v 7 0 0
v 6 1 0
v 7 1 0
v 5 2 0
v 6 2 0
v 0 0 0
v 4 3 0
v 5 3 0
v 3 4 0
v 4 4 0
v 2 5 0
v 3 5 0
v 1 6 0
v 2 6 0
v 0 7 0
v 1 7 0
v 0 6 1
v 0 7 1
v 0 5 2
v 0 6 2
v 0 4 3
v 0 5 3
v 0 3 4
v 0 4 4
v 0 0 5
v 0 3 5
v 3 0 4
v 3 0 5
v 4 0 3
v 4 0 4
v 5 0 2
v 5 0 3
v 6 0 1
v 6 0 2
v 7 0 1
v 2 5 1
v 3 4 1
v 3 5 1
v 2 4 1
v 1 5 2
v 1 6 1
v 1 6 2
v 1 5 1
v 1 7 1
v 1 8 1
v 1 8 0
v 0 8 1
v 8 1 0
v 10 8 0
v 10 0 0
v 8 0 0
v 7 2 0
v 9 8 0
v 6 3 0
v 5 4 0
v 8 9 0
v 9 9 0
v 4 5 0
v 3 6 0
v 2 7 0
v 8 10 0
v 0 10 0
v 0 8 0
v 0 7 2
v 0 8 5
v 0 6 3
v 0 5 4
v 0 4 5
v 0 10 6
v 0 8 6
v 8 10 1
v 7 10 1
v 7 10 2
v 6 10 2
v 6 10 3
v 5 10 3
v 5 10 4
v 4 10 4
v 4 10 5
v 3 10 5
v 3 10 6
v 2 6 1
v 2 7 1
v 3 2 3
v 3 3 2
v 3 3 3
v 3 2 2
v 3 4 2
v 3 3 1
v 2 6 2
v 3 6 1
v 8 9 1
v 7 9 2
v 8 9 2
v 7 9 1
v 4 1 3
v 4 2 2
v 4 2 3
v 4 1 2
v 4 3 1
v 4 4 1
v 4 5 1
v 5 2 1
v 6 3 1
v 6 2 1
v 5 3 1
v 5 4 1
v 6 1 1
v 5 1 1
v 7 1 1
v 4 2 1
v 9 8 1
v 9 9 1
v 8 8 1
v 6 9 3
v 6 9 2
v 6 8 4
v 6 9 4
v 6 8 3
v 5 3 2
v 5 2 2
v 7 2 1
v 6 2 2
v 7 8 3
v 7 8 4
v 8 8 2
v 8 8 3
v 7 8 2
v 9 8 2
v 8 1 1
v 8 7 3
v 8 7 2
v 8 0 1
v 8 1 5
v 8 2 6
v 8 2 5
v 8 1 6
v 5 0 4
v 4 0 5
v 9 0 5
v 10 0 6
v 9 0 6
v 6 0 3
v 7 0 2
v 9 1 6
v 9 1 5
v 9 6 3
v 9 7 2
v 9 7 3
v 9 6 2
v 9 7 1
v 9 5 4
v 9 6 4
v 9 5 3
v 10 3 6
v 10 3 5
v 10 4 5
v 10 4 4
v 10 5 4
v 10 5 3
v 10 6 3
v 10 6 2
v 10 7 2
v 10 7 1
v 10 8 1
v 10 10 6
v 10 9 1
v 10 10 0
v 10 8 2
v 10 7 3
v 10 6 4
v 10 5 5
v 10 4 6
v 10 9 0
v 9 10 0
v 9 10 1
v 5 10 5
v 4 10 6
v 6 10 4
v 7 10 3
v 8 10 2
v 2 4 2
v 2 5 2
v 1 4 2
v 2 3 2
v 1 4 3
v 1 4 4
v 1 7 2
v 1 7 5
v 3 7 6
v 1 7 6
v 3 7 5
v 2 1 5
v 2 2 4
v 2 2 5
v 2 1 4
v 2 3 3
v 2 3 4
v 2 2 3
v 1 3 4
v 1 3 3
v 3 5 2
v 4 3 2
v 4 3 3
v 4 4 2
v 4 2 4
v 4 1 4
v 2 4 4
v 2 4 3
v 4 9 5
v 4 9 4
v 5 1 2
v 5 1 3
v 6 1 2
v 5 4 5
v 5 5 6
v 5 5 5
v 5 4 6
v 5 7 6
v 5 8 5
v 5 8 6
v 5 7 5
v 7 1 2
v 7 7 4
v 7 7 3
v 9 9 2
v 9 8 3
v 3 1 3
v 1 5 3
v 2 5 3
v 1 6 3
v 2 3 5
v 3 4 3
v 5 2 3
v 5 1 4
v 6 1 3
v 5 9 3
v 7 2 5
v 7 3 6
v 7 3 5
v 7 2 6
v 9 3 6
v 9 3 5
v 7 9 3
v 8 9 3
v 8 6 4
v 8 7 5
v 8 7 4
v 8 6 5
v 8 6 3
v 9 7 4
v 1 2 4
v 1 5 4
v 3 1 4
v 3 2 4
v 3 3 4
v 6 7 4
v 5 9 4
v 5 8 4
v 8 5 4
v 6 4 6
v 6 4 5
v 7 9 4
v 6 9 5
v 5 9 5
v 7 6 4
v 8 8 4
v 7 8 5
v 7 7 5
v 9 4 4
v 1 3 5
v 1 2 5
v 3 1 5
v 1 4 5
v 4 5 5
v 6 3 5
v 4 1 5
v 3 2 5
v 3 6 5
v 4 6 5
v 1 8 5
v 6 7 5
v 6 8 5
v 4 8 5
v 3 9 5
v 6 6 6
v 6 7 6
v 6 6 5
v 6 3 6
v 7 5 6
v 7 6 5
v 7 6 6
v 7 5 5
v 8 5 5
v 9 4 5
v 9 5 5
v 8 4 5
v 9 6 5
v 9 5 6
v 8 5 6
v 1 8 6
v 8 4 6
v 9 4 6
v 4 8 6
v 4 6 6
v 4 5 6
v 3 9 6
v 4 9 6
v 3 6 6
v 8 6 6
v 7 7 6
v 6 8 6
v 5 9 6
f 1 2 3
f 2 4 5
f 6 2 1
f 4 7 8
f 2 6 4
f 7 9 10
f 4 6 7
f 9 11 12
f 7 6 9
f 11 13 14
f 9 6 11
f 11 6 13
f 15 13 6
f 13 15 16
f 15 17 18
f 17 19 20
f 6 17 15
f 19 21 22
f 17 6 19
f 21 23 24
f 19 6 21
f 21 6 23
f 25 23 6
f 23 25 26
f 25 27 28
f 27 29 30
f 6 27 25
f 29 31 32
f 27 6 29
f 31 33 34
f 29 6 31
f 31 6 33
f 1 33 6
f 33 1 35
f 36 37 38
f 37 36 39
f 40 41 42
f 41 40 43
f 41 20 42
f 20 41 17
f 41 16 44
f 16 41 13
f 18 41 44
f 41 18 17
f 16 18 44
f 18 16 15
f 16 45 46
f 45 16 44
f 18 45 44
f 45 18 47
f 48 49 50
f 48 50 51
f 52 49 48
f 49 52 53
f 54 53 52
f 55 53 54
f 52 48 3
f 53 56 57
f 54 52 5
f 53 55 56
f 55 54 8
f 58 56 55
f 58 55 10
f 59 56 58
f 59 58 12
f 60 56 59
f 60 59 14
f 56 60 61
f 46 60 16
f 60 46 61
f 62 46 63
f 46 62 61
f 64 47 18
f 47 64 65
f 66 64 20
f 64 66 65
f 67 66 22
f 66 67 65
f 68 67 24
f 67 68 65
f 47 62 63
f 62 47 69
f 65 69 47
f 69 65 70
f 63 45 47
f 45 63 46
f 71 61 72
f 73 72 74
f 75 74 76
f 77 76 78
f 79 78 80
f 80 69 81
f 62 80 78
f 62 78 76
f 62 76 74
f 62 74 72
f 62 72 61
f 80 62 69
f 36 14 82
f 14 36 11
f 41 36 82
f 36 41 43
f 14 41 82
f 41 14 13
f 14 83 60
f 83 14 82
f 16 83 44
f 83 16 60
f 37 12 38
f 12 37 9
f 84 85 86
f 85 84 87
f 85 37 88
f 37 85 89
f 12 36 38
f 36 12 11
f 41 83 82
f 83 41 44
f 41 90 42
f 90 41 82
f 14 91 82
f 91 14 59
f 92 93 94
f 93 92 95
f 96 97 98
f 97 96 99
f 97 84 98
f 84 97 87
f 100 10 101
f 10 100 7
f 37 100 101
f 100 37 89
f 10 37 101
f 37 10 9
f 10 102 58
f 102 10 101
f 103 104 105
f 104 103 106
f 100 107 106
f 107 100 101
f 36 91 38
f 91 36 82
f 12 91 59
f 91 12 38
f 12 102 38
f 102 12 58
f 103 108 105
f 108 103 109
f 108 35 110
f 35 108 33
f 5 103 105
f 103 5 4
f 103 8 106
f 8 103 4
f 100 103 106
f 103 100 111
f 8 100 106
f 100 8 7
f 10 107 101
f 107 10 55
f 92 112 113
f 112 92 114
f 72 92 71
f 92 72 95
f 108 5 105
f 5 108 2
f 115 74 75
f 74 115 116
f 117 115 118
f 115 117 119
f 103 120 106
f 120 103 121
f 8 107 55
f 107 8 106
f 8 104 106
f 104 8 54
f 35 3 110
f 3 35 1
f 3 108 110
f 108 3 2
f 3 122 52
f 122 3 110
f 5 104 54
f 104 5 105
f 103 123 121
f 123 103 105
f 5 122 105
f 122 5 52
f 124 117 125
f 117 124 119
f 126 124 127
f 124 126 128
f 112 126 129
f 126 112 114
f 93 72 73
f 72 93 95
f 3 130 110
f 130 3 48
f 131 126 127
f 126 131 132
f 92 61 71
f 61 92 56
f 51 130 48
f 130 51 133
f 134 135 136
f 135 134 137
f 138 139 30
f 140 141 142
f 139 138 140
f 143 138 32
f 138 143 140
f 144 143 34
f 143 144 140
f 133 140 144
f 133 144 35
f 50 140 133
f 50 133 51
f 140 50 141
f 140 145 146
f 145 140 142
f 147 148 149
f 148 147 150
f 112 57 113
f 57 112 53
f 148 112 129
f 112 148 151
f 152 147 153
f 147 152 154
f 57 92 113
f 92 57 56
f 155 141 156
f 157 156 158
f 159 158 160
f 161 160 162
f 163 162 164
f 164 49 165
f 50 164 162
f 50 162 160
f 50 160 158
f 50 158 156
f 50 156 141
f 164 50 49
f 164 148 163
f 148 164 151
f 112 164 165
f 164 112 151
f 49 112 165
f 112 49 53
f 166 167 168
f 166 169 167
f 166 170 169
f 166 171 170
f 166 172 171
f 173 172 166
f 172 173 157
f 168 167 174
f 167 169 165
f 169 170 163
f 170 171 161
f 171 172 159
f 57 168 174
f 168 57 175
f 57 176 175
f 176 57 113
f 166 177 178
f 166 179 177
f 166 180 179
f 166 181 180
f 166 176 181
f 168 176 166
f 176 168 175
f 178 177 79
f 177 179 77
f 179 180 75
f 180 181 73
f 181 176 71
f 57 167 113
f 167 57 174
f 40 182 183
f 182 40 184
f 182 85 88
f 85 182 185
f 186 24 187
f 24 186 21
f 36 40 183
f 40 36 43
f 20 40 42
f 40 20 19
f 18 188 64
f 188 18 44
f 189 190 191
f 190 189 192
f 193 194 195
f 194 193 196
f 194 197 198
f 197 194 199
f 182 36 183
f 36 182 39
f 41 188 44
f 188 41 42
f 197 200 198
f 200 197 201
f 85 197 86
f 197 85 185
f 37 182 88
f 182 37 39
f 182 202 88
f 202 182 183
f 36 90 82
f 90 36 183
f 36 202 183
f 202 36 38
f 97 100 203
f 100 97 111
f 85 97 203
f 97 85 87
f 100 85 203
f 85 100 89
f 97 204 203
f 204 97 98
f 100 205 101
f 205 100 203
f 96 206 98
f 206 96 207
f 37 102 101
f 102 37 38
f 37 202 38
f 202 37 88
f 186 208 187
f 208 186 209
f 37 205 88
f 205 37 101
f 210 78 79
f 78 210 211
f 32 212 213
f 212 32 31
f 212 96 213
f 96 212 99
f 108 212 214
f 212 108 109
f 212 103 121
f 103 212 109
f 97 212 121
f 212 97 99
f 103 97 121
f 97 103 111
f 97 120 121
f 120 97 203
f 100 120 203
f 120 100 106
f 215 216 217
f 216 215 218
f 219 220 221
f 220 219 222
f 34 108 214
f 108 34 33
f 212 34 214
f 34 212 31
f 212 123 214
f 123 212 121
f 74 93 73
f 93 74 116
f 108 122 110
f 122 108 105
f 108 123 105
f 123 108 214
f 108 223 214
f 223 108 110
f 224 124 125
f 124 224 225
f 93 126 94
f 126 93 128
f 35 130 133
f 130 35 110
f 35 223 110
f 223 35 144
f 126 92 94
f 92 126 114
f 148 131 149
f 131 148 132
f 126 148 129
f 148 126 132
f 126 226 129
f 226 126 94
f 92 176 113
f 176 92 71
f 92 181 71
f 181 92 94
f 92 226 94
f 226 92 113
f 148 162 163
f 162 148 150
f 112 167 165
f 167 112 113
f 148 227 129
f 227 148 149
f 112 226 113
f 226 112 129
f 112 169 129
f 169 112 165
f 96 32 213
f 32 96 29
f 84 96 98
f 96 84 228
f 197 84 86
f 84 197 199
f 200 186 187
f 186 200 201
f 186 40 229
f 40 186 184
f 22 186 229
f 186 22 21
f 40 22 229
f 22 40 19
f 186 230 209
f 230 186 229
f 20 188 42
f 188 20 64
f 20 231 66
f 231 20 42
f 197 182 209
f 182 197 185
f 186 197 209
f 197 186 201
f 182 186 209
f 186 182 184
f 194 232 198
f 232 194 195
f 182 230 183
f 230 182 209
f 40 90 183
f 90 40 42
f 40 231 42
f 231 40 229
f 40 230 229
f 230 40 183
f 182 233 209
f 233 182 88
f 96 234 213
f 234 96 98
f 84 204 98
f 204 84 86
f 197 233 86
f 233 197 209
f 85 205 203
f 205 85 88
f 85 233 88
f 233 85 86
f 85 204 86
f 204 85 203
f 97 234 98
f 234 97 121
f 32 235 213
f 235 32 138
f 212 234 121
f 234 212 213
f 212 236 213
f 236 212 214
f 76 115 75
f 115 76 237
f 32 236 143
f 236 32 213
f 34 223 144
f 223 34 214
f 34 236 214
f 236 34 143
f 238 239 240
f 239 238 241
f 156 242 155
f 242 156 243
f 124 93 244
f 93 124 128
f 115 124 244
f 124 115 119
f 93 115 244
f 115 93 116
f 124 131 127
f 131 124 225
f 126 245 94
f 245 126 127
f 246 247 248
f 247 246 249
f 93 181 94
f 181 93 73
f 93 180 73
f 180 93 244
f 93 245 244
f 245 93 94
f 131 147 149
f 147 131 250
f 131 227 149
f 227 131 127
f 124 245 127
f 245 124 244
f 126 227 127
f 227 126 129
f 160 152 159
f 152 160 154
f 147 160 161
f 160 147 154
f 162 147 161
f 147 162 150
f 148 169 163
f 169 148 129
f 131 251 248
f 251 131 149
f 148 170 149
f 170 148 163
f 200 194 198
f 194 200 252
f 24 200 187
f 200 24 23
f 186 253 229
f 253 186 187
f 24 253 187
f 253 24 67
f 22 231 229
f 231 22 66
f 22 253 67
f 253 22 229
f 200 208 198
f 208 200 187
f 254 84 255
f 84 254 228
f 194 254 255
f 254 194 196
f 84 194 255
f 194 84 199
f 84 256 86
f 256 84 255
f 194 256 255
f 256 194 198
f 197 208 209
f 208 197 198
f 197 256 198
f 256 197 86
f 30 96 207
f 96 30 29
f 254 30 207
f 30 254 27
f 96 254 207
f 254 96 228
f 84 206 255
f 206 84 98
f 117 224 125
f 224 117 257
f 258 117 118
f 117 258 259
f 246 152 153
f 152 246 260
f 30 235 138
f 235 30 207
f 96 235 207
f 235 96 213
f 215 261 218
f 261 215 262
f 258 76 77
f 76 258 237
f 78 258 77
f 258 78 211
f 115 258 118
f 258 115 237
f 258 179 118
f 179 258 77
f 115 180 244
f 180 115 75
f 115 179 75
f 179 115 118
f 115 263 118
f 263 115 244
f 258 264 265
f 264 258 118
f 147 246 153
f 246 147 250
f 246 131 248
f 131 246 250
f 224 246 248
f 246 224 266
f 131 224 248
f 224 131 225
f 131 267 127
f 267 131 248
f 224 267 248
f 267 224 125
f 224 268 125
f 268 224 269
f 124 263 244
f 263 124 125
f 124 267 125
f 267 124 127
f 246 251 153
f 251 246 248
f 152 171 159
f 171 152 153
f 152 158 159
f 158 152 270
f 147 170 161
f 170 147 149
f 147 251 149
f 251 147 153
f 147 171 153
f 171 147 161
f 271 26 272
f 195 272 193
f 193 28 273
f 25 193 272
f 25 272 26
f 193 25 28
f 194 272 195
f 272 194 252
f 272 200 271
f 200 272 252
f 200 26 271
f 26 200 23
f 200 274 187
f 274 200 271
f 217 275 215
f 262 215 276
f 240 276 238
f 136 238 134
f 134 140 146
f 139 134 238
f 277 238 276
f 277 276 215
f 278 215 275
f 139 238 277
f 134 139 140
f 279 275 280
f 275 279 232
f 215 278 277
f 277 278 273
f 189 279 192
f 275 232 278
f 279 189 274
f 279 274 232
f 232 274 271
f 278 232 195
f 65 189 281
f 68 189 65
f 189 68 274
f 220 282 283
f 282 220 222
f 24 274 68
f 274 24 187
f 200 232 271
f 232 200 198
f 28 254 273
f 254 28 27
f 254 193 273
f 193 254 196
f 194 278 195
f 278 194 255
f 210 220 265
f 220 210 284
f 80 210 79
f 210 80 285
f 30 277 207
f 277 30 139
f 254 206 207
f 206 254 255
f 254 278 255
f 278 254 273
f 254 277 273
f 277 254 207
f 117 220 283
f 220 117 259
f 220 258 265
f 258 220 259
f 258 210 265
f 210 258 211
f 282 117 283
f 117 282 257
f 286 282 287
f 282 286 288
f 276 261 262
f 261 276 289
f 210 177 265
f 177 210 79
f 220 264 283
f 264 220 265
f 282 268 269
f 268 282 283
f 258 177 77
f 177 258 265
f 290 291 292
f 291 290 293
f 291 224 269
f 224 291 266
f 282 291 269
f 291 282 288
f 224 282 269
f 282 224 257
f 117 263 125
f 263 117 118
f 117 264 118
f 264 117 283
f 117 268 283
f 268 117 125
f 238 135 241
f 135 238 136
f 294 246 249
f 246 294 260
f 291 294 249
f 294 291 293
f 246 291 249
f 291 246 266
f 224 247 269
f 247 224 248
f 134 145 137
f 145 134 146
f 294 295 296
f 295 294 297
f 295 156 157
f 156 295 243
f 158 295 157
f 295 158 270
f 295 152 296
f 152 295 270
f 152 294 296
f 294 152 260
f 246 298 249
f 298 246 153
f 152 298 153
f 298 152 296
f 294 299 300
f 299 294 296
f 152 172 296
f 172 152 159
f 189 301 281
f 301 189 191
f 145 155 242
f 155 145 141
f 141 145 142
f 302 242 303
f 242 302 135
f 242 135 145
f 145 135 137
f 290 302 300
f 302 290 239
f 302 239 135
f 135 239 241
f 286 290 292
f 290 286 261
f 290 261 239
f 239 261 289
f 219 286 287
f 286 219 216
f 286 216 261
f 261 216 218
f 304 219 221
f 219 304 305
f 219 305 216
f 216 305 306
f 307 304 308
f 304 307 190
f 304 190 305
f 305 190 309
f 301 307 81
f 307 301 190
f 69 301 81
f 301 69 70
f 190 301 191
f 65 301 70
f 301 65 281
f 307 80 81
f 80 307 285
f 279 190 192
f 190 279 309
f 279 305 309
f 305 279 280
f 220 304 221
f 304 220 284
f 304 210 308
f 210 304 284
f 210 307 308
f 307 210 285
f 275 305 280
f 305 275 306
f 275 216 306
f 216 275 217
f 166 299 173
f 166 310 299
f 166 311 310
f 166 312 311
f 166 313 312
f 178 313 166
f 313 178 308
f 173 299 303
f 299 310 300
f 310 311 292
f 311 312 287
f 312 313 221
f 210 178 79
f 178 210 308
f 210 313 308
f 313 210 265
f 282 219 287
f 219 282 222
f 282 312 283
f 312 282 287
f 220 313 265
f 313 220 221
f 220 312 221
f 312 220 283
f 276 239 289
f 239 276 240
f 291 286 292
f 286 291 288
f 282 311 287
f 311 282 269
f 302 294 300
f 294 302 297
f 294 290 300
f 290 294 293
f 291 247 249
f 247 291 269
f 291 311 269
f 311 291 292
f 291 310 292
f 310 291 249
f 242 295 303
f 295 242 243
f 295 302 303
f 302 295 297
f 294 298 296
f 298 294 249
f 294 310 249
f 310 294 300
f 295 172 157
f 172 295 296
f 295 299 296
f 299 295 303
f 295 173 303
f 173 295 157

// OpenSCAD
union() {
    translate([0, 0, 0]) cube([1, 1, 1]);
    translate([0, 1, 0]) cube([1, 1, 1]);
    translate([0, 2, 0]) cube([1, 1, 1]);
    translate([0, 3, 0]) cube([1, 1, 1]);
    translate([0, 4, 0]) cube([1, 1, 1]);
    translate([0, 5, 0]) cube([1, 1, 1]);
    translate([0, 6, 0]) cube([1, 1, 1]);
    translate([0, 8, 0]) cube([1, 1, 1]);
    translate([0, 9, 0]) cube([1, 1, 1]);
    translate([1, 0, 0]) cube([1, 1, 1]);
    translate([1, 1, 0]) cube([1, 1, 1]);
    translate([1, 2, 0]) cube([1, 1, 1]);
    translate([1, 3, 0]) cube([1, 1, 1]);
    translate([1, 4, 0]) cube([1, 1, 1]);
    translate([1, 5, 0]) cube([1, 1, 1]);
    translate([1, 7, 0]) cube([1, 1, 1]);
    translate([1, 8, 0]) cube([1, 1, 1]);
    translate([1, 9, 0]) cube([1, 1, 1]);
    translate([2, 0, 0]) cube([1, 1, 1]);
    translate([2, 1, 0]) cube([1, 1, 1]);
    translate([2, 2, 0]) cube([1, 1, 1]);
    translate([2, 3, 0]) cube([1, 1, 1]);
    translate([2, 4, 0]) cube([1, 1, 1]);
    translate([2, 6, 0]) cube([1, 1, 1]);
    translate([2, 7, 0]) cube([1, 1, 1]);
    translate([2, 8, 0]) cube([1, 1, 1]);
    translate([2, 9, 0]) cube([1, 1, 1]);
    translate([3, 0, 0]) cube([1, 1, 1]);
    translate([3, 1, 0]) cube([1, 1, 1]);
    translate([3, 2, 0]) cube([1, 1, 1]);
    translate([3, 3, 0]) cube([1, 1, 1]);
    translate([3, 5, 0]) cube([1, 1, 1]);
    translate([3, 6, 0]) cube([1, 1, 1]);
    translate([3, 7, 0]) cube([1, 1, 1]);
    translate([3, 8, 0]) cube([1, 1, 1]);
    translate([3, 9, 0]) cube([1, 1, 1]);
    translate([4, 0, 0]) cube([1, 1, 1]);
    translate([4, 1, 0]) cube([1, 1, 1]);
    translate([4, 2, 0]) cube([1, 1, 1]);
    translate([4, 4, 0]) cube([1, 1, 1]);
    translate([4, 5, 0]) cube([1, 1, 1]);
    translate([4, 6, 0]) cube([1, 1, 1]);
    translate([4, 7, 0]) cube([1, 1, 1]);
    translate([4, 8, 0]) cube([1, 1, 1]);
    translate([4, 9, 0]) cube([1, 1, 1]);
    translate([5, 0, 0]) cube([1, 1, 1]);
    translate([5, 1, 0]) cube([1, 1, 1]);
    translate([5, 3, 0]) cube([1, 1, 1]);
    translate([5, 4, 0]) cube([1, 1, 1]);
    translate([5, 5, 0]) cube([1, 1, 1]);
    translate([5, 6, 0]) cube([1, 1, 1]);
    translate([5, 7, 0]) cube([1, 1, 1]);
    translate([5, 8, 0]) cube([1, 1, 1]);
    translate([5, 9, 0]) cube([1, 1, 1]);
    translate([6, 0, 0]) cube([1, 1, 1]);
    translate([6, 2, 0]) cube([1, 1, 1]);
    translate([6, 3, 0]) cube([1, 1, 1]);
    translate([6, 4, 0]) cube([1, 1, 1]);
    translate([6, 5, 0]) cube([1, 1, 1]);
    translate([6, 6, 0]) cube([1, 1, 1]);
    translate([6, 7, 0]) cube([1, 1, 1]);
    translate([6, 8, 0]) cube([1, 1, 1]);
    translate([6, 9, 0]) cube([1, 1, 1]);
    translate([7, 1, 0]) cube([1, 1, 1]);
    translate([7, 2, 0]) cube([1, 1, 1]);
    translate([7, 3, 0]) cube([1, 1, 1]);
    translate([7, 4, 0]) cube([1, 1, 1]);
    translate([7, 5, 0]) cube([1, 1, 1]);
    translate([7, 6, 0]) cube([1, 1, 1]);
    translate([7, 7, 0]) cube([1, 1, 1]);
    translate([7, 8, 0]) cube([1, 1, 1]);
    translate([7, 9, 0]) cube([1, 1, 1]);
    translate([8, 0, 0]) cube([1, 1, 1]);
    translate([8, 1, 0]) cube([1, 1, 1]);
    translate([8, 2, 0]) cube([1, 1, 1]);
    translate([8, 3, 0]) cube([1, 1, 1]);
    translate([8, 4, 0]) cube([1, 1, 1]);
    translate([8, 5, 0]) cube([1, 1, 1]);
    translate([8, 6, 0]) cube([1, 1, 1]);
    translate([8, 7, 0]) cube([1, 1, 1]);
    translate([8, 8, 0]) cube([1, 1, 1]);
    translate([9, 0, 0]) cube([1, 1, 1]);
    translate([9, 1, 0]) cube([1, 1, 1]);
    translate([9, 2, 0]) cube([1, 1, 1]);
    translate([9, 3, 0]) cube([1, 1, 1]);
    translate([9, 4, 0]) cube([1, 1, 1]);
    translate([9, 5, 0]) cube([1, 1, 1]);
    translate([9, 6, 0]) cube([1, 1, 1]);
    translate([9, 7, 0]) cube([1, 1, 1]);
    translate([9, 9, 0]) cube([1, 1, 1]);
    translate([0, 0, 1]) cube([1, 1, 1]);
    translate([0, 1, 1]) cube([1, 1, 1]);
    translate([0, 2, 1]) cube([1, 1, 1]);
    translate([0, 3, 1]) cube([1, 1, 1]);
    translate([0, 4, 1]) cube([1, 1, 1]);
    translate([0, 5, 1]) cube([1, 1, 1]);
    translate([0, 7, 1]) cube([1, 1, 1]);
    translate([0, 8, 1]) cube([1, 1, 1]);
    translate([0, 9, 1]) cube([1, 1, 1]);
    translate([1, 0, 1]) cube([1, 1, 1]);
    translate([1, 1, 1]) cube([1, 1, 1]);
    translate([1, 2, 1]) cube([1, 1, 1]);
    translate([1, 3, 1]) cube([1, 1, 1]);
    translate([1, 4, 1]) cube([1, 1, 1]);
    translate([1, 6, 1]) cube([1, 1, 1]);
    translate([1, 7, 1]) cube([1, 1, 1]);
    translate([1, 8, 1]) cube([1, 1, 1]);
    translate([1, 9, 1]) cube([1, 1, 1]);
    translate([2, 0, 1]) cube([1, 1, 1]);
    translate([2, 1, 1]) cube([1, 1, 1]);
    translate([2, 2, 1]) cube([1, 1, 1]);
    translate([2, 3, 1]) cube([1, 1, 1]);
    translate([2, 5, 1]) cube([1, 1, 1]);
    translate([2, 6, 1]) cube([1, 1, 1]);
    translate([2, 7, 1]) cube([1, 1, 1]);
    translate([2, 8, 1]) cube([1, 1, 1]);
    translate([2, 9, 1]) cube([1, 1, 1]);
    translate([3, 0, 1]) cube([1, 1, 1]);
    translate([3, 1, 1]) cube([1, 1, 1]);
    translate([3, 2, 1]) cube([1, 1, 1]);
    translate([3, 4, 1]) cube([1, 1, 1]);
    translate([3, 5, 1]) cube([1, 1, 1]);
    translate([3, 6, 1]) cube([1, 1, 1]);
    translate([3, 7, 1]) cube([1, 1, 1]);
    translate([3, 8, 1]) cube([1, 1, 1]);
    translate([3, 9, 1]) cube([1, 1, 1]);
    translate([4, 0, 1]) cube([1, 1, 1]);
    translate([4, 1, 1]) cube([1, 1, 1]);
    translate([4, 3, 1]) cube([1, 1, 1]);
    translate([4, 4, 1]) cube([1, 1, 1]);
    translate([4, 5, 1]) cube([1, 1, 1]);
    translate([4, 6, 1]) cube([1, 1, 1]);
    translate([4, 7, 1]) cube([1, 1, 1]);
    translate([4, 8, 1]) cube([1, 1, 1]);
    translate([4, 9, 1]) cube([1, 1, 1]);
    translate([5, 0, 1]) cube([1, 1, 1]);
    translate([5, 2, 1]) cube([1, 1, 1]);
    translate([5, 3, 1]) cube([1, 1, 1]);
    translate([5, 4, 1]) cube([1, 1, 1]);
    translate([5, 5, 1]) cube([1, 1, 1]);
    translate([5, 6, 1]) cube([1, 1, 1]);
    translate([5, 7, 1]) cube([1, 1, 1]);
    translate([5, 8, 1]) cube([1, 1, 1]);
    translate([5, 9, 1]) cube([1, 1, 1]);
    translate([6, 1, 1]) cube([1, 1, 1]);
    translate([6, 2, 1]) cube([1, 1, 1]);
    translate([6, 3, 1]) cube([1, 1, 1]);
    translate([6, 4, 1]) cube([1, 1, 1]);
    translate([6, 5, 1]) cube([1, 1, 1]);
    translate([6, 6, 1]) cube([1, 1, 1]);
    translate([6, 7, 1]) cube([1, 1, 1]);
    translate([6, 8, 1]) cube([1, 1, 1]);
    translate([6, 9, 1]) cube([1, 1, 1]);
    translate([7, 0, 1]) cube([1, 1, 1]);
    translate([7, 1, 1]) cube([1, 1, 1]);
    translate([7, 2, 1]) cube([1, 1, 1]);
    translate([7, 3, 1]) cube([1, 1, 1]);
    translate([7, 4, 1]) cube([1, 1, 1]);
    translate([7, 5, 1]) cube([1, 1, 1]);
    translate([7, 6, 1]) cube([1, 1, 1]);
    translate([7, 7, 1]) cube([1, 1, 1]);
    translate([7, 8, 1]) cube([1, 1, 1]);
    translate([8, 0, 1]) cube([1, 1, 1]);
    translate([8, 1, 1]) cube([1, 1, 1]);
    translate([8, 2, 1]) cube([1, 1, 1]);
    translate([8, 3, 1]) cube([1, 1, 1]);
    translate([8, 4, 1]) cube([1, 1, 1]);
    translate([8, 5, 1]) cube([1, 1, 1]);
    translate([8, 6, 1]) cube([1, 1, 1]);
    translate([8, 7, 1]) cube([1, 1, 1]);
    translate([8, 9, 1]) cube([1, 1, 1]);
    translate([9, 0, 1]) cube([1, 1, 1]);
    translate([9, 1, 1]) cube([1, 1, 1]);
    translate([9, 2, 1]) cube([1, 1, 1]);
    translate([9, 3, 1]) cube([1, 1, 1]);
    translate([9, 4, 1]) cube([1, 1, 1]);
    translate([9, 5, 1]) cube([1, 1, 1]);
    translate([9, 6, 1]) cube([1, 1, 1]);
    translate([9, 8, 1]) cube([1, 1, 1]);
    translate([9, 9, 1]) cube([1, 1, 1]);
    translate([0, 0, 2]) cube([1, 1, 1]);
    translate([0, 1, 2]) cube([1, 1, 1]);
    translate([0, 2, 2]) cube([1, 1, 1]);
    translate([0, 3, 2]) cube([1, 1, 1]);
    translate([0, 4, 2]) cube([1, 1, 1]);
    translate([0, 6, 2]) cube([1, 1, 1]);
    translate([0, 7, 2]) cube([1, 1, 1]);
    translate([0, 8, 2]) cube([1, 1, 1]);
    translate([0, 9, 2]) cube([1, 1, 1]);
    translate([1, 0, 2]) cube([1, 1, 1]);
    translate([1, 1, 2]) cube([1, 1, 1]);
    translate([1, 2, 2]) cube([1, 1, 1]);
    translate([1, 3, 2]) cube([1, 1, 1]);
    translate([1, 5, 2]) cube([1, 1, 1]);
    translate([1, 6, 2]) cube([1, 1, 1]);
    translate([1, 7, 2]) cube([1, 1, 1]);
    translate([1, 8, 2]) cube([1, 1, 1]);
    translate([1, 9, 2]) cube([1, 1, 1]);
    translate([2, 0, 2]) cube([1, 1, 1]);
    translate([2, 1, 2]) cube([1, 1, 1]);
    translate([2, 2, 2]) cube([1, 1, 1]);
    translate([2, 4, 2]) cube([1, 1, 1]);
    translate([2, 5, 2]) cube([1, 1, 1]);
    translate([2, 6, 2]) cube([1, 1, 1]);
    translate([2, 7, 2]) cube([1, 1, 1]);
    translate([2, 8, 2]) cube([1, 1, 1]);
    translate([2, 9, 2]) cube([1, 1, 1]);
    translate([3, 0, 2]) cube([1, 1, 1]);
    translate([3, 1, 2]) cube([1, 1, 1]);
    translate([3, 3, 2]) cube([1, 1, 1]);
    translate([3, 4, 2]) cube([1, 1, 1]);
    translate([3, 5, 2]) cube([1, 1, 1]);
    translate([3, 6, 2]) cube([1, 1, 1]);
    translate([3, 7, 2]) cube([1, 1, 1]);
    translate([3, 8, 2]) cube([1, 1, 1]);
    translate([3, 9, 2]) cube([1, 1, 1]);
    translate([4, 0, 2]) cube([1, 1, 1]);
    translate([4, 2, 2]) cube([1, 1, 1]);
    translate([4, 3, 2]) cube([1, 1, 1]);
    translate([4, 4, 2]) cube([1, 1, 1]);
    translate([4, 5, 2]) cube([1, 1, 1]);
    translate([4, 6, 2]) cube([1, 1, 1]);
    translate([4, 7, 2]) cube([1, 1, 1]);
    translate([4, 8, 2]) cube([1, 1, 1]);
    translate([4, 9, 2]) cube([1, 1, 1]);
    translate([5, 1, 2]) cube([1, 1, 1]);
    translate([5, 2, 2]) cube([1, 1, 1]);
    translate([5, 3, 2]) cube([1, 1, 1]);
    translate([5, 4, 2]) cube([1, 1, 1]);
    translate([5, 5, 2]) cube([1, 1, 1]);
    translate([5, 6, 2]) cube([1, 1, 1]);
    translate([5, 7, 2]) cube([1, 1, 1]);
    translate([5, 8, 2]) cube([1, 1, 1]);
    translate([5, 9, 2]) cube([1, 1, 1]);
    translate([6, 0, 2]) cube([1, 1, 1]);
    translate([6, 1, 2]) cube([1, 1, 1]);
    translate([6, 2, 2]) cube([1, 1, 1]);
    translate([6, 3, 2]) cube([1, 1, 1]);
    translate([6, 4, 2]) cube([1, 1, 1]);
    translate([6, 5, 2]) cube([1, 1, 1]);
    translate([6, 6, 2]) cube([1, 1, 1]);
    translate([6, 7, 2]) cube([1, 1, 1]);
    translate([6, 8, 2]) cube([1, 1, 1]);
    translate([7, 0, 2]) cube([1, 1, 1]);
    translate([7, 1, 2]) cube([1, 1, 1]);
    translate([7, 2, 2]) cube([1, 1, 1]);
    translate([7, 3, 2]) cube([1, 1, 1]);
    translate([7, 4, 2]) cube([1, 1, 1]);
    translate([7, 5, 2]) cube([1, 1, 1]);
    translate([7, 6, 2]) cube([1, 1, 1]);
    translate([7, 7, 2]) cube([1, 1, 1]);
    translate([7, 9, 2]) cube([1, 1, 1]);
    translate([8, 0, 2]) cube([1, 1, 1]);
    translate([8, 1, 2]) cube([1, 1, 1]);
    translate([8, 2, 2]) cube([1, 1, 1]);
    translate([8, 3, 2]) cube([1, 1, 1]);
    translate([8, 4, 2]) cube([1, 1, 1]);
    translate([8, 5, 2]) cube([1, 1, 1]);
    translate([8, 6, 2]) cube([1, 1, 1]);
    translate([8, 8, 2]) cube([1, 1, 1]);
    translate([8, 9, 2]) cube([1, 1, 1]);
    translate([9, 0, 2]) cube([1, 1, 1]);
    translate([9, 1, 2]) cube([1, 1, 1]);
    translate([9, 2, 2]) cube([1, 1, 1]);
    translate([9, 3, 2]) cube([1, 1, 1]);
    translate([9, 4, 2]) cube([1, 1, 1]);
    translate([9, 5, 2]) cube([1, 1, 1]);
    translate([9, 7, 2]) cube([1, 1, 1]);
    translate([9, 8, 2]) cube([1, 1, 1]);
    translate([9, 9, 2]) cube([1, 1, 1]);
    translate([0, 0, 3]) cube([1, 1, 1]);
    translate([0, 1, 3]) cube([1, 1, 1]);
    translate([0, 2, 3]) cube([1, 1, 1]);
    translate([0, 3, 3]) cube([1, 1, 1]);
    translate([0, 5, 3]) cube([1, 1, 1]);
    translate([0, 6, 3]) cube([1, 1, 1]);
    translate([0, 7, 3]) cube([1, 1, 1]);
    translate([0, 8, 3]) cube([1, 1, 1]);
    translate([0, 9, 3]) cube([1, 1, 1]);
    translate([1, 0, 3]) cube([1, 1, 1]);
    translate([1, 1, 3]) cube([1, 1, 1]);
    translate([1, 2, 3]) cube([1, 1, 1]);
    translate([1, 4, 3]) cube([1, 1, 1]);
    translate([1, 5, 3]) cube([1, 1, 1]);
    translate([1, 6, 3]) cube([1, 1, 1]);
    translate([1, 7, 3]) cube([1, 1, 1]);
    translate([1, 8, 3]) cube([1, 1, 1]);
    translate([1, 9, 3]) cube([1, 1, 1]);
    translate([2, 0, 3]) cube([1, 1, 1]);
    translate([2, 1, 3]) cube([1, 1, 1]);
    translate([2, 3, 3]) cube([1, 1, 1]);
    translate([2, 4, 3]) cube([1, 1, 1]);
    translate([2, 5, 3]) cube([1, 1, 1]);
    translate([2, 6, 3]) cube([1, 1, 1]);
    translate([2, 7, 3]) cube([1, 1, 1]);
    translate([2, 8, 3]) cube([1, 1, 1]);
    translate([2, 9, 3]) cube([1, 1, 1]);
    translate([3, 0, 3]) cube([1, 1, 1]);
    translate([3, 2, 3]) cube([1, 1, 1]);
    translate([3, 3, 3]) cube([1, 1, 1]);
    translate([3, 4, 3]) cube([1, 1, 1]);
    translate([3, 5, 3]) cube([1, 1, 1]);
    translate([3, 6, 3]) cube([1, 1, 1]);
    translate([3, 7, 3]) cube([1, 1, 1]);
    translate([3, 8, 3]) cube([1, 1, 1]);
    translate([3, 9, 3]) cube([1, 1, 1]);
    translate([4, 1, 3]) cube([1, 1, 1]);
    translate([4, 2, 3]) cube([1, 1, 1]);
    translate([4, 3, 3]) cube([1, 1, 1]);
    translate([4, 4, 3]) cube([1, 1, 1]);
    translate([4, 5, 3]) cube([1, 1, 1]);
    translate([4, 6, 3]) cube([1, 1, 1]);
    translate([4, 7, 3]) cube([1, 1, 1]);
    translate([4, 8, 3]) cube([1, 1, 1]);
    translate([4, 9, 3]) cube([1, 1, 1]);
    translate([5, 0, 3]) cube([1, 1, 1]);
    translate([5, 1, 3]) cube([1, 1, 1]);
    translate([5, 2, 3]) cube([1, 1, 1]);
    translate([5, 3, 3]) cube([1, 1, 1]);
    translate([5, 4, 3]) cube([1, 1, 1]);
    translate([5, 5, 3]) cube([1, 1, 1]);
    translate([5, 6, 3]) cube([1, 1, 1]);
    translate([5, 7, 3]) cube([1, 1, 1]);
    translate([5, 8, 3]) cube([1, 1, 1]);
    translate([6, 0, 3]) cube([1, 1, 1]);
    translate([6, 1, 3]) cube([1, 1, 1]);
    translate([6, 2, 3]) cube([1, 1, 1]);
    translate([6, 3, 3]) cube([1, 1, 1]);
    translate([6, 4, 3]) cube([1, 1, 1]);
    translate([6, 5, 3]) cube([1, 1, 1]);
    translate([6, 6, 3]) cube([1, 1, 1]);
    translate([6, 7, 3]) cube([1, 1, 1]);
    translate([6, 9, 3]) cube([1, 1, 1]);
    translate([7, 0, 3]) cube([1, 1, 1]);
    translate([7, 1, 3]) cube([1, 1, 1]);
    translate([7, 2, 3]) cube([1, 1, 1]);
    translate([7, 3, 3]) cube([1, 1, 1]);
    translate([7, 4, 3]) cube([1, 1, 1]);
    translate([7, 5, 3]) cube([1, 1, 1]);
    translate([7, 6, 3]) cube([1, 1, 1]);
    translate([7, 8, 3]) cube([1, 1, 1]);
    translate([7, 9, 3]) cube([1, 1, 1]);
    translate([8, 0, 3]) cube([1, 1, 1]);
    translate([8, 1, 3]) cube([1, 1, 1]);
    translate([8, 2, 3]) cube([1, 1, 1]);
    translate([8, 3, 3]) cube([1, 1, 1]);
    translate([8, 4, 3]) cube([1, 1, 1]);
    translate([8, 5, 3]) cube([1, 1, 1]);
    translate([8, 7, 3]) cube([1, 1, 1]);
    translate([8, 8, 3]) cube([1, 1, 1]);
    translate([8, 9, 3]) cube([1, 1, 1]);
    translate([9, 0, 3]) cube([1, 1, 1]);
    translate([9, 1, 3]) cube([1, 1, 1]);
    translate([9, 2, 3]) cube([1, 1, 1]);
    translate([9, 3, 3]) cube([1, 1, 1]);
    translate([9, 4, 3]) cube([1, 1, 1]);
    translate([9, 6, 3]) cube([1, 1, 1]);
    translate([9, 7, 3]) cube([1, 1, 1]);
    translate([9, 8, 3]) cube([1, 1, 1]);
    translate([9, 9, 3]) cube([1, 1, 1]);
    translate([0, 0, 4]) cube([1, 1, 1]);
    translate([0, 1, 4]) cube([1, 1, 1]);
    translate([0, 2, 4]) cube([1, 1, 1]);
    translate([0, 4, 4]) cube([1, 1, 1]);
    translate([0, 5, 4]) cube([1, 1, 1]);
    translate([0, 6, 4]) cube([1, 1, 1]);
    translate([0, 7, 4]) cube([1, 1, 1]);
    translate([0, 8, 4]) cube([1, 1, 1]);
    translate([0, 9, 4]) cube([1, 1, 1]);
    translate([1, 0, 4]) cube([1, 1, 1]);
    translate([1, 1, 4]) cube([1, 1, 1]);
    translate([1, 3, 4]) cube([1, 1, 1]);
    translate([1, 4, 4]) cube([1, 1, 1]);
    translate([1, 5, 4]) cube([1, 1, 1]);
    translate([1, 6, 4]) cube([1, 1, 1]);
    translate([1, 7, 4]) cube([1, 1, 1]);
    translate([1, 8, 4]) cube([1, 1, 1]);
    translate([1, 9, 4]) cube([1, 1, 1]);
    translate([2, 0, 4]) cube([1, 1, 1]);
    translate([2, 2, 4]) cube([1, 1, 1]);
    translate([2, 3, 4]) cube([1, 1, 1]);
    translate([2, 4, 4]) cube([1, 1, 1]);
    translate([2, 5, 4]) cube([1, 1, 1]);
    translate([2, 6, 4]) cube([1, 1, 1]);
    translate([2, 7, 4]) cube([1, 1, 1]);
    translate([2, 8, 4]) cube([1, 1, 1]);
    translate([2, 9, 4]) cube([1, 1, 1]);
    translate([3, 1, 4]) cube([1, 1, 1]);
    translate([3, 2, 4]) cube([1, 1, 1]);
    translate([3, 3, 4]) cube([1, 1, 1]);
    translate([3, 4, 4]) cube([1, 1, 1]);
    translate([3, 5, 4]) cube([1, 1, 1]);
    translate([3, 6, 4]) cube([1, 1, 1]);
    translate([3, 7, 4]) cube([1, 1, 1]);
    translate([3, 8, 4]) cube([1, 1, 1]);
    translate([3, 9, 4]) cube([1, 1, 1]);
    translate([4, 0, 4]) cube([1, 1, 1]);
    translate([4, 1, 4]) cube([1, 1, 1]);
    translate([4, 2, 4]) cube([1, 1, 1]);
    translate([4, 3, 4]) cube([1, 1, 1]);
    translate([4, 4, 4]) cube([1, 1, 1]);
    translate([4, 5, 4]) cube([1, 1, 1]);
    translate([4, 6, 4]) cube([1, 1, 1]);
    translate([4, 7, 4]) cube([1, 1, 1]);
    translate([4, 8, 4]) cube([1, 1, 1]);
    translate([5, 0, 4]) cube([1, 1, 1]);
    translate([5, 1, 4]) cube([1, 1, 1]);
    translate([5, 2, 4]) cube([1, 1, 1]);
    translate([5, 3, 4]) cube([1, 1, 1]);
    translate([5, 4, 4]) cube([1, 1, 1]);
    translate([5, 5, 4]) cube([1, 1, 1]);
    translate([5, 6, 4]) cube([1, 1, 1]);
    translate([5, 7, 4]) cube([1, 1, 1]);
    translate([5, 9, 4]) cube([1, 1, 1]);
    translate([6, 0, 4]) cube([1, 1, 1]);
    translate([6, 1, 4]) cube([1, 1, 1]);
    translate([6, 2, 4]) cube([1, 1, 1]);
    translate([6, 3, 4]) cube([1, 1, 1]);
    translate([6, 4, 4]) cube([1, 1, 1]);
    translate([6, 5, 4]) cube([1, 1, 1]);
    translate([6, 6, 4]) cube([1, 1, 1]);
    translate([6, 8, 4]) cube([1, 1, 1]);
    translate([6, 9, 4]) cube([1, 1, 1]);
    translate([7, 0, 4]) cube([1, 1, 1]);
    translate([7, 1, 4]) cube([1, 1, 1]);
    translate([7, 2, 4]) cube([1, 1, 1]);
    translate([7, 3, 4]) cube([1, 1, 1]);
    translate([7, 4, 4]) cube([1, 1, 1]);
    translate([7, 5, 4]) cube([1, 1, 1]);
    translate([7, 7, 4]) cube([1, 1, 1]);
    translate([7, 8, 4]) cube([1, 1, 1]);
    translate([7, 9, 4]) cube([1, 1, 1]);
    translate([8, 0, 4]) cube([1, 1, 1]);
    translate([8, 1, 4]) cube([1, 1, 1]);
    translate([8, 2, 4]) cube([1, 1, 1]);
    translate([8, 3, 4]) cube([1, 1, 1]);
    translate([8, 4, 4]) cube([1, 1, 1]);
    translate([8, 6, 4]) cube([1, 1, 1]);
    translate([8, 7, 4]) cube([1, 1, 1]);
    translate([8, 8, 4]) cube([1, 1, 1]);
    translate([8, 9, 4]) cube([1, 1, 1]);
    translate([9, 0, 4]) cube([1, 1, 1]);
    translate([9, 1, 4]) cube([1, 1, 1]);
    translate([9, 2, 4]) cube([1, 1, 1]);
    translate([9, 3, 4]) cube([1, 1, 1]);
    translate([9, 5, 4]) cube([1, 1, 1]);
    translate([9, 6, 4]) cube([1, 1, 1]);
    translate([9, 7, 4]) cube([1, 1, 1]);
    translate([9, 8, 4]) cube([1, 1, 1]);
    translate([9, 9, 4]) cube([1, 1, 1]);
    translate([0, 8, 5]) cube([1, 1, 1]);
    translate([0, 9, 5]) cube([1, 1, 1]);
    translate([1, 7, 5]) cube([1, 1, 1]);
    translate([1, 8, 5]) cube([1, 1, 1]);
    translate([1, 9, 5]) cube([1, 1, 1]);
    translate([2, 7, 5]) cube([1, 1, 1]);
    translate([2, 8, 5]) cube([1, 1, 1]);
    translate([2, 9, 5]) cube([1, 1, 1]);
    translate([3, 6, 5]) cube([1, 1, 1]);
    translate([3, 7, 5]) cube([1, 1, 1]);
    translate([3, 8, 5]) cube([1, 1, 1]);
    translate([4, 5, 5]) cube([1, 1, 1]);
    translate([4, 6, 5]) cube([1, 1, 1]);
    translate([4, 7, 5]) cube([1, 1, 1]);
    translate([4, 9, 5]) cube([1, 1, 1]);
    translate([5, 4, 5]) cube([1, 1, 1]);
    translate([5, 5, 5]) cube([1, 1, 1]);
    translate([5, 6, 5]) cube([1, 1, 1]);
    translate([5, 8, 5]) cube([1, 1, 1]);
    translate([5, 9, 5]) cube([1, 1, 1]);
    translate([6, 3, 5]) cube([1, 1, 1]);
    translate([6, 4, 5]) cube([1, 1, 1]);
    translate([6, 5, 5]) cube([1, 1, 1]);
    translate([6, 7, 5]) cube([1, 1, 1]);
    translate([6, 8, 5]) cube([1, 1, 1]);
    translate([6, 9, 5]) cube([1, 1, 1]);
    translate([7, 2, 5]) cube([1, 1, 1]);
    translate([7, 3, 5]) cube([1, 1, 1]);
    translate([7, 4, 5]) cube([1, 1, 1]);
    translate([7, 6, 5]) cube([1, 1, 1]);
    translate([7, 7, 5]) cube([1, 1, 1]);
    translate([7, 8, 5]) cube([1, 1, 1]);
    translate([7, 9, 5]) cube([1, 1, 1]);
    translate([8, 1, 5]) cube([1, 1, 1]);
    translate([8, 2, 5]) cube([1, 1, 1]);
    translate([8, 3, 5]) cube([1, 1, 1]);
    translate([8, 5, 5]) cube([1, 1, 1]);
    translate([8, 6, 5]) cube([1, 1, 1]);
    translate([8, 7, 5]) cube([1, 1, 1]);
    translate([8, 8, 5]) cube([1, 1, 1]);
    translate([8, 9, 5]) cube([1, 1, 1]);
    translate([9, 0, 5]) cube([1, 1, 1]);
    translate([9, 1, 5]) cube([1, 1, 1]);
    translate([9, 2, 5]) cube([1, 1, 1]);
    translate([9, 4, 5]) cube([1, 1, 1]);
    translate([9, 5, 5]) cube([1, 1, 1]);
    translate([9, 6, 5]) cube([1, 1, 1]);
    translate([9, 7, 5]) cube([1, 1, 1]);
    translate([9, 8, 5]) cube([1, 1, 1]);
    translate([9, 9, 5]) cube([1, 1, 1]);
}
